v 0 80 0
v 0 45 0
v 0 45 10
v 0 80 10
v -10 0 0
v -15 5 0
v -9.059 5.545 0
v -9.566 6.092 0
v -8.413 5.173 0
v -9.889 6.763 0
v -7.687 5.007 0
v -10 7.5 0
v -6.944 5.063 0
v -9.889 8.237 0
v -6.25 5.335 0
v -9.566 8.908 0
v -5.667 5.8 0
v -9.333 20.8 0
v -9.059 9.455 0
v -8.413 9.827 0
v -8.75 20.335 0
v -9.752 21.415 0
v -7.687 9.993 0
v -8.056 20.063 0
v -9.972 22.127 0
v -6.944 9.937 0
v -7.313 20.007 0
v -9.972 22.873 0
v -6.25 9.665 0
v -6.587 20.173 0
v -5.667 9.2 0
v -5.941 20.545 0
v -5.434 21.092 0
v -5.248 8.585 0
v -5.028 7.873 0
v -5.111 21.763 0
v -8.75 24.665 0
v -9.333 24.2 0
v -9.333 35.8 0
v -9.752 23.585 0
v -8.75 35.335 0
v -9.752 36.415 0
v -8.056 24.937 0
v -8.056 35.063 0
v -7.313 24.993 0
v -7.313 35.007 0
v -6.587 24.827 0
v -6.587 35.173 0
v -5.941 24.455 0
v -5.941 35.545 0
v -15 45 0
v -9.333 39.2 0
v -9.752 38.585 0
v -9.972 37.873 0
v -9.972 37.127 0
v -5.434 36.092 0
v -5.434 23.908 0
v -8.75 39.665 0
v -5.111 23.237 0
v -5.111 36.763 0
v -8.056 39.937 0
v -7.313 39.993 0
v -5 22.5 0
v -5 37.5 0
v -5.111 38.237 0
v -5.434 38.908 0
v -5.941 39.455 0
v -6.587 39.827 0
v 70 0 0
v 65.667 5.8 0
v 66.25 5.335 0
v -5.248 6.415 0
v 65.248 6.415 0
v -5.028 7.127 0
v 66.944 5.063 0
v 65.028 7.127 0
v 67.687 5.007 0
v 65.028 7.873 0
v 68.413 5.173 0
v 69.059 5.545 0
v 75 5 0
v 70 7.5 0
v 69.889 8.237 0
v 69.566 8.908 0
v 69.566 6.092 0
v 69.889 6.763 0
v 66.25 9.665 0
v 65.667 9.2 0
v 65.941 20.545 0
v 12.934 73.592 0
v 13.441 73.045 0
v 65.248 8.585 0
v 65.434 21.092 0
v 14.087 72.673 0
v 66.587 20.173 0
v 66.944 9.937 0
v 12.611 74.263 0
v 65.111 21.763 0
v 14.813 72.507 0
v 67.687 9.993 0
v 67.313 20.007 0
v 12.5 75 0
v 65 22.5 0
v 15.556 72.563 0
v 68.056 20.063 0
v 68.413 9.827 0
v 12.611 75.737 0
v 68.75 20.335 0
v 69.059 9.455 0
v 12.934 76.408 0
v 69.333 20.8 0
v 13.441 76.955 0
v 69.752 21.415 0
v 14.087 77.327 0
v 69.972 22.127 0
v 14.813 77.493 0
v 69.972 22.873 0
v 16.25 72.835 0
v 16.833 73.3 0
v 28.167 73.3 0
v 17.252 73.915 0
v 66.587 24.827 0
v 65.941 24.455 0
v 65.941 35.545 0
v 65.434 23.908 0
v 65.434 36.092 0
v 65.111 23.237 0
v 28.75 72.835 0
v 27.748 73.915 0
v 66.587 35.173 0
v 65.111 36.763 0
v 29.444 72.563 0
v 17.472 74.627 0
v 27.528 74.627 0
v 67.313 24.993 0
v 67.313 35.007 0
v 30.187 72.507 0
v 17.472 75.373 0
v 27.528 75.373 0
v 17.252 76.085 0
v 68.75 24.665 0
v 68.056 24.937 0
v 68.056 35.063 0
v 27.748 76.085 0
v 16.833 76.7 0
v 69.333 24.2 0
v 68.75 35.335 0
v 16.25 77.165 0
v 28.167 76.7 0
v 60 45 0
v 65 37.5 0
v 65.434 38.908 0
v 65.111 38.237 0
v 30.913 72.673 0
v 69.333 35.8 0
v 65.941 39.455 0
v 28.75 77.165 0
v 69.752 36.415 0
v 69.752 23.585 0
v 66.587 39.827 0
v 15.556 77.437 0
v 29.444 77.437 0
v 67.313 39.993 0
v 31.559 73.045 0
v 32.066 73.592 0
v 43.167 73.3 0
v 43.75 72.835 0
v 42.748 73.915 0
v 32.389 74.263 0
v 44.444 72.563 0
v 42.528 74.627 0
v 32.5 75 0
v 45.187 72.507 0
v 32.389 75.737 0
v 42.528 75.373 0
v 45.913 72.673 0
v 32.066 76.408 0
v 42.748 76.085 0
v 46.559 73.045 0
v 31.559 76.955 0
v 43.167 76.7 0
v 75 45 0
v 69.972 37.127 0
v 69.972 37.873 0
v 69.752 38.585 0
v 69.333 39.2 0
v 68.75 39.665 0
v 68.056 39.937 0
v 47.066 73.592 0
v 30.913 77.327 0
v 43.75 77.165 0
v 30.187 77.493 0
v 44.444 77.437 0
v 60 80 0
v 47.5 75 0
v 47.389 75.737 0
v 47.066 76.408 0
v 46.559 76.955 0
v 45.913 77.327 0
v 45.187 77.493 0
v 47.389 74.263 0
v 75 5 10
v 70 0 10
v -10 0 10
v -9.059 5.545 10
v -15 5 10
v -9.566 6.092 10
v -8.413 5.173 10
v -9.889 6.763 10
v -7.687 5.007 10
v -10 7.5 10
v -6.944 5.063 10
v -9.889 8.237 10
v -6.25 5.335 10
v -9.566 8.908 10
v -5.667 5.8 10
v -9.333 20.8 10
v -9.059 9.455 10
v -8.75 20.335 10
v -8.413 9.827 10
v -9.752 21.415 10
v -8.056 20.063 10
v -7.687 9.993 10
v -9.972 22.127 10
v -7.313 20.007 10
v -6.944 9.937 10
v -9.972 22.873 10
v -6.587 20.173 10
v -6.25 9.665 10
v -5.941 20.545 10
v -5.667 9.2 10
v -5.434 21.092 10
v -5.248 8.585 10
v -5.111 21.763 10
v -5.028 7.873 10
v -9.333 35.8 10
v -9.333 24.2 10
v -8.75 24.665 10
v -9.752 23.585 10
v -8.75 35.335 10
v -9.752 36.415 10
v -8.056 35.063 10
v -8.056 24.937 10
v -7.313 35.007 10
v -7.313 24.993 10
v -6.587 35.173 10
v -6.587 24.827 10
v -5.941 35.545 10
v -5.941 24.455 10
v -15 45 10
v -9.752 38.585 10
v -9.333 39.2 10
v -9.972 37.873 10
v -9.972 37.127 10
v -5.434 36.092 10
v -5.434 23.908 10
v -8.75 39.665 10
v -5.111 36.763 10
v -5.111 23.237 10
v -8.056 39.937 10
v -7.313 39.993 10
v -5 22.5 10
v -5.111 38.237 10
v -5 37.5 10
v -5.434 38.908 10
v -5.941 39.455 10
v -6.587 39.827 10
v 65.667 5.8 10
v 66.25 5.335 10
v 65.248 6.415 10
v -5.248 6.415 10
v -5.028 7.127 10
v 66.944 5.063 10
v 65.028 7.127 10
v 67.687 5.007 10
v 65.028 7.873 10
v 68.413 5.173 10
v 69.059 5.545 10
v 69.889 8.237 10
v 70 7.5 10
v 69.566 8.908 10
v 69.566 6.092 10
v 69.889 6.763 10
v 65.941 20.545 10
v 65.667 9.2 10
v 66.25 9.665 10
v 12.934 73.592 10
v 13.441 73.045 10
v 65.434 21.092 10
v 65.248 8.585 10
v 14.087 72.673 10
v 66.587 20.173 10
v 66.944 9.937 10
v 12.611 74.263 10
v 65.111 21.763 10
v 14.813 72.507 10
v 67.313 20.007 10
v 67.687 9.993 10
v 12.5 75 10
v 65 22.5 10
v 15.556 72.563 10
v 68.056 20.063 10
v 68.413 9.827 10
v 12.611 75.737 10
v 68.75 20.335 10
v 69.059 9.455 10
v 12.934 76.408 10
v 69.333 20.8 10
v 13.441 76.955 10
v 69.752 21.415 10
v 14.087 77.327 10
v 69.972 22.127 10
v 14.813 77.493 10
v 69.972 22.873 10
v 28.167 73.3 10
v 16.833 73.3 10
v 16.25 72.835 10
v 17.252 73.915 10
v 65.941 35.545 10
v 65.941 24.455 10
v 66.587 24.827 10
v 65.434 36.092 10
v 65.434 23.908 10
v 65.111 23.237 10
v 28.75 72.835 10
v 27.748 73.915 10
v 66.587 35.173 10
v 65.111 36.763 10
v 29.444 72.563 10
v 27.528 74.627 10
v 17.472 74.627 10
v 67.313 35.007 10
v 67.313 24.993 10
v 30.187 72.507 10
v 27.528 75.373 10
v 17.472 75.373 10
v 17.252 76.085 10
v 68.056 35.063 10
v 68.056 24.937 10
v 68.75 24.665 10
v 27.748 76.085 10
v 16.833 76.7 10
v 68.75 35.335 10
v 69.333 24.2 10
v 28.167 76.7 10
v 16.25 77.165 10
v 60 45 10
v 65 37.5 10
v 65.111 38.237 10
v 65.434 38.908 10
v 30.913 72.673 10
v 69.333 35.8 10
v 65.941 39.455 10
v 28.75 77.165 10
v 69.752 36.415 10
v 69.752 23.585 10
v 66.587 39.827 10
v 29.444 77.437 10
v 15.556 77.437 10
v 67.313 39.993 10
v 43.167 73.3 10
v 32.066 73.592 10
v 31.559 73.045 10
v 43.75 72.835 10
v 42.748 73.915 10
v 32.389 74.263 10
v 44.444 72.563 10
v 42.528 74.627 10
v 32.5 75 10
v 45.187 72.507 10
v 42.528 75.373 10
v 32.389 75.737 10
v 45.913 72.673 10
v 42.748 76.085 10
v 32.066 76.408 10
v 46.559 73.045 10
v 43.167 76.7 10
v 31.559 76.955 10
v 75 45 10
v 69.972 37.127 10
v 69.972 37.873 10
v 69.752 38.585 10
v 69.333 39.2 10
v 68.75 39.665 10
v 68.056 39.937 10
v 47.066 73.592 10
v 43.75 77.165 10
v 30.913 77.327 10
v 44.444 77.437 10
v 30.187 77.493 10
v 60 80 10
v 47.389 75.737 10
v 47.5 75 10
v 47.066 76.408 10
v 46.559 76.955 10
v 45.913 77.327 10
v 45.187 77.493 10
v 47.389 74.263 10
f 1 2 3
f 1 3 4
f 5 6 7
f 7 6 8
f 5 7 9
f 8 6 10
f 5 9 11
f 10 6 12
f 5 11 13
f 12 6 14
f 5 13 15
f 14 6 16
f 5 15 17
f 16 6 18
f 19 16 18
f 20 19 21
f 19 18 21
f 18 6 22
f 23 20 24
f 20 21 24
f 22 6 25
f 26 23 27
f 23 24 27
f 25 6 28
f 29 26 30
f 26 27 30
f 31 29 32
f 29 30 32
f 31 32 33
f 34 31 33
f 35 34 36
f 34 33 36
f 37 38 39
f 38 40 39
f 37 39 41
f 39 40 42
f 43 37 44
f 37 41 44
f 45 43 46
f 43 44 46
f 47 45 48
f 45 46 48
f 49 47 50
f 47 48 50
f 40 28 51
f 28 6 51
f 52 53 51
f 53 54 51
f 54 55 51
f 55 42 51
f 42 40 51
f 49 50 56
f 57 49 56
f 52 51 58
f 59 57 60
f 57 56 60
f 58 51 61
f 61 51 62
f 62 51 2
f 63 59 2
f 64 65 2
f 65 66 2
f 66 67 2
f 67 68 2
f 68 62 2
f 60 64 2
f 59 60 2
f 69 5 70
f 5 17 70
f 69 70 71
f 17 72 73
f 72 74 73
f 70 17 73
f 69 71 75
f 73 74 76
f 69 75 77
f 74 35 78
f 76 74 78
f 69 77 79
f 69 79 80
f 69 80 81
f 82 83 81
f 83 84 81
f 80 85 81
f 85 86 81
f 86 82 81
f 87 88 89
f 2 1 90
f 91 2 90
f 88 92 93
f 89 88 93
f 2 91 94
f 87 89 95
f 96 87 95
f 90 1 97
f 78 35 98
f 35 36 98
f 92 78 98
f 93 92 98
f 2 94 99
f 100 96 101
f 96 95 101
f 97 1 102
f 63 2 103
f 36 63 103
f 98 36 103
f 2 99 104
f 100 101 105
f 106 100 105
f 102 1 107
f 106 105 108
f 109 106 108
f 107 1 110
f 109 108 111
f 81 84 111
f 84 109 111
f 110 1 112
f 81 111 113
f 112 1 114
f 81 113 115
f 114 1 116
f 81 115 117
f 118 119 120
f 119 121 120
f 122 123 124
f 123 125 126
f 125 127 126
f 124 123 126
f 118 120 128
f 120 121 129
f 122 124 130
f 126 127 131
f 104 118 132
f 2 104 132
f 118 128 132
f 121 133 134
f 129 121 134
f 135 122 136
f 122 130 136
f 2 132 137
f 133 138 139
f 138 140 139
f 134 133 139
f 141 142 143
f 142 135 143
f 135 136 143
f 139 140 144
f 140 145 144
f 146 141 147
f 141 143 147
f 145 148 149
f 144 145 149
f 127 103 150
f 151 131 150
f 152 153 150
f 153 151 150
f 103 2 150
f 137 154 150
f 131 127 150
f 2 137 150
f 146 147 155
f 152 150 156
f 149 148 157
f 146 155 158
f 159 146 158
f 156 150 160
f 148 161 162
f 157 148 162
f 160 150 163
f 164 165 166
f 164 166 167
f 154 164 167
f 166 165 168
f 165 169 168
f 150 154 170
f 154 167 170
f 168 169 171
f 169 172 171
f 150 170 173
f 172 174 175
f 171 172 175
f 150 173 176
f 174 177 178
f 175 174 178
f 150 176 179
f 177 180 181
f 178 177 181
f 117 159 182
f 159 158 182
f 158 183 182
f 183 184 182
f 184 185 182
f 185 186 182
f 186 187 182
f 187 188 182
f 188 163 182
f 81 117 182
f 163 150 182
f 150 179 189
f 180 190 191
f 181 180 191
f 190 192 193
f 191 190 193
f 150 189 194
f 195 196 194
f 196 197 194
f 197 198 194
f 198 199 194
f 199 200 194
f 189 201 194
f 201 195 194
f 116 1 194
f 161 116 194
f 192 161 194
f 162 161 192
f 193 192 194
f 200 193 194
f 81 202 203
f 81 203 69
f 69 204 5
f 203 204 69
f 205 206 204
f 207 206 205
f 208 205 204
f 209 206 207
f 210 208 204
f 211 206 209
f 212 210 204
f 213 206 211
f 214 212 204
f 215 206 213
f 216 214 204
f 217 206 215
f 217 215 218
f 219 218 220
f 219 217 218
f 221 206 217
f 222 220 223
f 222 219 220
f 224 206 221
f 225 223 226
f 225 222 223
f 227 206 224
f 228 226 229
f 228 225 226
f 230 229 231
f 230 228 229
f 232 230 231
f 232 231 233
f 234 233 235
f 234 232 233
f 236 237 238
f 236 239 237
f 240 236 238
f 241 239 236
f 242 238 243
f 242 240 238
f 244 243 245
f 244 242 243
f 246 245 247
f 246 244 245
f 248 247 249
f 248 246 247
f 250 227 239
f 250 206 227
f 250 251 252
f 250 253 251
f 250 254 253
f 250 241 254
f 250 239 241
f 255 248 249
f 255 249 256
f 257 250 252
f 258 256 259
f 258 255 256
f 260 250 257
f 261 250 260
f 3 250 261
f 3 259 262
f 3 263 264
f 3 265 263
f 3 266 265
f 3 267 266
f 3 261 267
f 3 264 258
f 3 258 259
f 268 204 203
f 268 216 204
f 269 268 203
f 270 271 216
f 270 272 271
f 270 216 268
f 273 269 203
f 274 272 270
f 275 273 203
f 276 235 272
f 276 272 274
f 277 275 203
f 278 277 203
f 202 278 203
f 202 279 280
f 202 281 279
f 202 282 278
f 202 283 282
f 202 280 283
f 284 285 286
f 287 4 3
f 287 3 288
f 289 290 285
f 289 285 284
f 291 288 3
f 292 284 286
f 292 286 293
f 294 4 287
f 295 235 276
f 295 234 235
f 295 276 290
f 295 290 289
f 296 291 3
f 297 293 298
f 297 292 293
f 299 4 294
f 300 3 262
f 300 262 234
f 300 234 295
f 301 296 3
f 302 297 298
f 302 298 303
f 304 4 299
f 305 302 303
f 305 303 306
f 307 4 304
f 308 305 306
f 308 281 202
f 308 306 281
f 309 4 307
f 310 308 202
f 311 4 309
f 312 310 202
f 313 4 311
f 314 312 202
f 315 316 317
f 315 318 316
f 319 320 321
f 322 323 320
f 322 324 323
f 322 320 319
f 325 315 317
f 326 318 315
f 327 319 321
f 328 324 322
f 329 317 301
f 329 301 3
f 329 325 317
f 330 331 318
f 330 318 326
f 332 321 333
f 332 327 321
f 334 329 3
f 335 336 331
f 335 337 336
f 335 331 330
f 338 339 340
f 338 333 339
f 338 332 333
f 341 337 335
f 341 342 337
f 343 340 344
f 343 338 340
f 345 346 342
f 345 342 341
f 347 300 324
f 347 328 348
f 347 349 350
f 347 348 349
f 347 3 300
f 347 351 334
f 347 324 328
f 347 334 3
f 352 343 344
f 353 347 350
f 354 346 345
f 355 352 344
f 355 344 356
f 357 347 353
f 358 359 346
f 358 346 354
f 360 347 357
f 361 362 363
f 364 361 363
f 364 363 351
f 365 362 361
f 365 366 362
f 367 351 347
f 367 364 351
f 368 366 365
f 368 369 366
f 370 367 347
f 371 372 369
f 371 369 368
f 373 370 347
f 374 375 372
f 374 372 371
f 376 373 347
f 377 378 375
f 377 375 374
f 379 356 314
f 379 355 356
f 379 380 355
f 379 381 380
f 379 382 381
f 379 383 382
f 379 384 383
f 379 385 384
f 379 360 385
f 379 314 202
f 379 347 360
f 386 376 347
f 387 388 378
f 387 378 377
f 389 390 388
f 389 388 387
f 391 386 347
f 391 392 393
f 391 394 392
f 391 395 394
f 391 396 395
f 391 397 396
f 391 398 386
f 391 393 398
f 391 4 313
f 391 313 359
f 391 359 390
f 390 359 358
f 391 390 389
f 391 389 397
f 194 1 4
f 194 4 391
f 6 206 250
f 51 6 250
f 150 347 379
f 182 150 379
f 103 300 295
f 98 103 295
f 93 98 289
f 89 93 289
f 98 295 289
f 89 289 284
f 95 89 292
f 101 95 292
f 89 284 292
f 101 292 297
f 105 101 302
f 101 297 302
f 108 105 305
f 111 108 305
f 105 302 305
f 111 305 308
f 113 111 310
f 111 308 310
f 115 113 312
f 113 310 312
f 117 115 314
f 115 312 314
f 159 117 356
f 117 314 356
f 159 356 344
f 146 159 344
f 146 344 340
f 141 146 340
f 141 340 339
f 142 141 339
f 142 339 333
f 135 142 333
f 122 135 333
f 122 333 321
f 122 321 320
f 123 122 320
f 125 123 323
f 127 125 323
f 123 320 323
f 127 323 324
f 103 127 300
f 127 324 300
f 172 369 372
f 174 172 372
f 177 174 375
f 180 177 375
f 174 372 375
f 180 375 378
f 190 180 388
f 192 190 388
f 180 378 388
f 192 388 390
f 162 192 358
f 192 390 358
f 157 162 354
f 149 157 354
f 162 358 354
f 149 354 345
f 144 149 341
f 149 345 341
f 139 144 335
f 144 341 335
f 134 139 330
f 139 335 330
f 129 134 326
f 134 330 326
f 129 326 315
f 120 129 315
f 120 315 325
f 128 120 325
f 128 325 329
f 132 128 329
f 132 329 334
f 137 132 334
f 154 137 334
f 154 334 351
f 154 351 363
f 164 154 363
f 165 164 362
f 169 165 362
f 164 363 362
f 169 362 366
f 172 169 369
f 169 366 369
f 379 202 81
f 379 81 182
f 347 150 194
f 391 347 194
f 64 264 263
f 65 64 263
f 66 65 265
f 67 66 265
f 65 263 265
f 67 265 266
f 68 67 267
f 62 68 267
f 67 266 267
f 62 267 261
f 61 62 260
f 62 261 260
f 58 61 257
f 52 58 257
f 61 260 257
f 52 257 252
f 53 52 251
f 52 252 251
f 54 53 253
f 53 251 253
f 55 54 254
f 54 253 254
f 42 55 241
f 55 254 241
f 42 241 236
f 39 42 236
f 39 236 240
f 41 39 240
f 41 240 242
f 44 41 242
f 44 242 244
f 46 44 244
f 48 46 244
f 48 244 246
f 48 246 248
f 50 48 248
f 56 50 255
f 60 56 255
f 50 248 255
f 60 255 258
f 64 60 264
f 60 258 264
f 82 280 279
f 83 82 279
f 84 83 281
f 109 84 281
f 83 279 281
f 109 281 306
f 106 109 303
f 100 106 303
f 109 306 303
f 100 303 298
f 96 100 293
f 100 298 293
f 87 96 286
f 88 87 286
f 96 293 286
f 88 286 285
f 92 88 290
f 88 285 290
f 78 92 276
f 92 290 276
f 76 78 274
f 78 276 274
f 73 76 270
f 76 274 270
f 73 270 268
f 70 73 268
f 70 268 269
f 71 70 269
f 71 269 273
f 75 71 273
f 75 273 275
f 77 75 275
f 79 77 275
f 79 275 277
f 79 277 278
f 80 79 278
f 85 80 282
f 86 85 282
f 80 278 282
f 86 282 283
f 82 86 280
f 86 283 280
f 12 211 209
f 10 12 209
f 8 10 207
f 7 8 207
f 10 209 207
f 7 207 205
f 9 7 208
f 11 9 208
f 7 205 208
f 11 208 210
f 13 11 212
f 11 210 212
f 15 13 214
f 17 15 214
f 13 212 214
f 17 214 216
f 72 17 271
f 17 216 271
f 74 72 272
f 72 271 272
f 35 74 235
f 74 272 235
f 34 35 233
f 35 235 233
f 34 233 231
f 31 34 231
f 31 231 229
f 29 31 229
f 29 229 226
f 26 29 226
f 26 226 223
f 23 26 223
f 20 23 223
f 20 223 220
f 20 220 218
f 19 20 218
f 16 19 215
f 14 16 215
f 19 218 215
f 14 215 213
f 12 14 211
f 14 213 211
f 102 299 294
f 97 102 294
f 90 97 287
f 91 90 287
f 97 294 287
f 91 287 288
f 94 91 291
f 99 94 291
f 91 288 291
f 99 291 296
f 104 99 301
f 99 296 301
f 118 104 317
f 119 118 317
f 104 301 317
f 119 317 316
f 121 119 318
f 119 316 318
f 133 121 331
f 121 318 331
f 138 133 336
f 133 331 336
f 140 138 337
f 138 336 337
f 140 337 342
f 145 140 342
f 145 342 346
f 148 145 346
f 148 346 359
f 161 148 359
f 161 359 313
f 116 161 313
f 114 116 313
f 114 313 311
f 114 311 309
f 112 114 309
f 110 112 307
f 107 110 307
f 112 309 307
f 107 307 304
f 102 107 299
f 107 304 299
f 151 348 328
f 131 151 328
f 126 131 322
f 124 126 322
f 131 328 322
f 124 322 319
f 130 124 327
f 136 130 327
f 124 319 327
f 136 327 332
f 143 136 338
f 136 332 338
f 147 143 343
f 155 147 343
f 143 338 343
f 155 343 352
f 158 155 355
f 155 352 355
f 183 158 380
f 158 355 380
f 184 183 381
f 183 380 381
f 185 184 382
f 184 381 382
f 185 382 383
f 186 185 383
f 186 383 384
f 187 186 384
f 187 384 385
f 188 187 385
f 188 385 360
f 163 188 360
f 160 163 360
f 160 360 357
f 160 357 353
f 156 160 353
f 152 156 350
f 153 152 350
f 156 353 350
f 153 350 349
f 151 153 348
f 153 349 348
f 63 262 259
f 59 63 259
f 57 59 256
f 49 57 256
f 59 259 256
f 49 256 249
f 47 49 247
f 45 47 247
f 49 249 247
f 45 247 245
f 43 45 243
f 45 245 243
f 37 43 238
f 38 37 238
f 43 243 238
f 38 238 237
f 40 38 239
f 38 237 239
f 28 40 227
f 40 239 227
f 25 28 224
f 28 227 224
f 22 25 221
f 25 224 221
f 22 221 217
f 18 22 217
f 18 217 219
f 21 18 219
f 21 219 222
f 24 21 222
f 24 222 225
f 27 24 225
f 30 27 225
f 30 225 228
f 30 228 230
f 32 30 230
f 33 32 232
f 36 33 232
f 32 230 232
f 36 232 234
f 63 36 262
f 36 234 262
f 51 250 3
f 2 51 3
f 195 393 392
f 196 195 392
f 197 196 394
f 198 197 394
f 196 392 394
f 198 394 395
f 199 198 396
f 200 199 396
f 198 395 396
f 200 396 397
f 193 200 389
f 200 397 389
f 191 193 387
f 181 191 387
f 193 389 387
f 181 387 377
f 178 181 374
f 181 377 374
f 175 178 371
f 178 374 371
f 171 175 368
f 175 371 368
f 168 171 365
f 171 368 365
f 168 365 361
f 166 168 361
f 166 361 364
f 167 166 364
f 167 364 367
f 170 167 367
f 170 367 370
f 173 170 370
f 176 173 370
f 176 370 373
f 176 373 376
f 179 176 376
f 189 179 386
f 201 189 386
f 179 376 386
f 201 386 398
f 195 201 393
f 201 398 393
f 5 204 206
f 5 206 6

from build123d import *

# Parameters (mm, degrees)
ESQUISSE1_W             = 60
ESQUISSE1_H             = 80
BOSS_EXTRU_1_DEPTH      = 10
ESQUISSE3_W             = 15
ESQUISSE3_H             = 45
BOSS_EXTRU_2_DEPTH      = 10
ESQUISSE2_R             = 2.5
ENL_V_MAT_EXTRU_1_DEPTH = 10
CHANFREIN1_SIZE         = 5


with BuildPart() as part:
    # Esquisse1 → Boss.-Extru.1 (new body)
    with BuildSketch(Plane.XY):
        with Locations((30, 40)):
            Rectangle(ESQUISSE1_W, ESQUISSE1_H)
    extrude(amount=BOSS_EXTRU_1_DEPTH)

    # Esquisse3 → Boss.-Extru.2 (add)
    with BuildSketch(Plane.XY.offset(10)):
        with Locations((-7.5, 22.5)):
            Rectangle(ESQUISSE3_W, ESQUISSE3_H)
        with Locations((67.5, 22.5)):
            Rectangle(ESQUISSE3_W, ESQUISSE3_H)
    extrude(amount=-BOSS_EXTRU_2_DEPTH)

    # Esquisse2 → Enlèv. mat.-Extru.1 (cut)
    with BuildSketch(Plane.XY.offset(10)):
        with Locations((45, 75)):
            Circle(ESQUISSE2_R)
        with Locations((30, 75)):
            Circle(ESQUISSE2_R)
        with Locations(Location((15, 75, 0), (0, 0, 180))):
            Circle(ESQUISSE2_R)
        with Locations((-7.5, 22.5)):
            Circle(ESQUISSE2_R)
        with Locations((-7.5, 37.5)):
            Circle(ESQUISSE2_R)
        with Locations(Location((-7.5, 7.5, 0), (0, 0, 180))):
            Circle(ESQUISSE2_R)
        with Locations((67.5, 7.5)):
            Circle(ESQUISSE2_R)
        with Locations(Location((67.5, 37.5, 0), (0, 0, 180))):
            Circle(ESQUISSE2_R)
        with Locations(Location((67.5, 22.5, 0), (0, 0, 180))):
            Circle(ESQUISSE2_R)
    extrude(amount=-ENL_V_MAT_EXTRU_1_DEPTH, mode=Mode.SUBTRACT)

    # Chanfrein1
    chanfrein1_edges = [part.edges().sort_by_distance(p)[0] for p in [
        (-15, 0, 5),
        (75, 0, 5),
    ]]
    chamfer(chanfrein1_edges, length=CHANFREIN1_SIZE)


solid = part.part
